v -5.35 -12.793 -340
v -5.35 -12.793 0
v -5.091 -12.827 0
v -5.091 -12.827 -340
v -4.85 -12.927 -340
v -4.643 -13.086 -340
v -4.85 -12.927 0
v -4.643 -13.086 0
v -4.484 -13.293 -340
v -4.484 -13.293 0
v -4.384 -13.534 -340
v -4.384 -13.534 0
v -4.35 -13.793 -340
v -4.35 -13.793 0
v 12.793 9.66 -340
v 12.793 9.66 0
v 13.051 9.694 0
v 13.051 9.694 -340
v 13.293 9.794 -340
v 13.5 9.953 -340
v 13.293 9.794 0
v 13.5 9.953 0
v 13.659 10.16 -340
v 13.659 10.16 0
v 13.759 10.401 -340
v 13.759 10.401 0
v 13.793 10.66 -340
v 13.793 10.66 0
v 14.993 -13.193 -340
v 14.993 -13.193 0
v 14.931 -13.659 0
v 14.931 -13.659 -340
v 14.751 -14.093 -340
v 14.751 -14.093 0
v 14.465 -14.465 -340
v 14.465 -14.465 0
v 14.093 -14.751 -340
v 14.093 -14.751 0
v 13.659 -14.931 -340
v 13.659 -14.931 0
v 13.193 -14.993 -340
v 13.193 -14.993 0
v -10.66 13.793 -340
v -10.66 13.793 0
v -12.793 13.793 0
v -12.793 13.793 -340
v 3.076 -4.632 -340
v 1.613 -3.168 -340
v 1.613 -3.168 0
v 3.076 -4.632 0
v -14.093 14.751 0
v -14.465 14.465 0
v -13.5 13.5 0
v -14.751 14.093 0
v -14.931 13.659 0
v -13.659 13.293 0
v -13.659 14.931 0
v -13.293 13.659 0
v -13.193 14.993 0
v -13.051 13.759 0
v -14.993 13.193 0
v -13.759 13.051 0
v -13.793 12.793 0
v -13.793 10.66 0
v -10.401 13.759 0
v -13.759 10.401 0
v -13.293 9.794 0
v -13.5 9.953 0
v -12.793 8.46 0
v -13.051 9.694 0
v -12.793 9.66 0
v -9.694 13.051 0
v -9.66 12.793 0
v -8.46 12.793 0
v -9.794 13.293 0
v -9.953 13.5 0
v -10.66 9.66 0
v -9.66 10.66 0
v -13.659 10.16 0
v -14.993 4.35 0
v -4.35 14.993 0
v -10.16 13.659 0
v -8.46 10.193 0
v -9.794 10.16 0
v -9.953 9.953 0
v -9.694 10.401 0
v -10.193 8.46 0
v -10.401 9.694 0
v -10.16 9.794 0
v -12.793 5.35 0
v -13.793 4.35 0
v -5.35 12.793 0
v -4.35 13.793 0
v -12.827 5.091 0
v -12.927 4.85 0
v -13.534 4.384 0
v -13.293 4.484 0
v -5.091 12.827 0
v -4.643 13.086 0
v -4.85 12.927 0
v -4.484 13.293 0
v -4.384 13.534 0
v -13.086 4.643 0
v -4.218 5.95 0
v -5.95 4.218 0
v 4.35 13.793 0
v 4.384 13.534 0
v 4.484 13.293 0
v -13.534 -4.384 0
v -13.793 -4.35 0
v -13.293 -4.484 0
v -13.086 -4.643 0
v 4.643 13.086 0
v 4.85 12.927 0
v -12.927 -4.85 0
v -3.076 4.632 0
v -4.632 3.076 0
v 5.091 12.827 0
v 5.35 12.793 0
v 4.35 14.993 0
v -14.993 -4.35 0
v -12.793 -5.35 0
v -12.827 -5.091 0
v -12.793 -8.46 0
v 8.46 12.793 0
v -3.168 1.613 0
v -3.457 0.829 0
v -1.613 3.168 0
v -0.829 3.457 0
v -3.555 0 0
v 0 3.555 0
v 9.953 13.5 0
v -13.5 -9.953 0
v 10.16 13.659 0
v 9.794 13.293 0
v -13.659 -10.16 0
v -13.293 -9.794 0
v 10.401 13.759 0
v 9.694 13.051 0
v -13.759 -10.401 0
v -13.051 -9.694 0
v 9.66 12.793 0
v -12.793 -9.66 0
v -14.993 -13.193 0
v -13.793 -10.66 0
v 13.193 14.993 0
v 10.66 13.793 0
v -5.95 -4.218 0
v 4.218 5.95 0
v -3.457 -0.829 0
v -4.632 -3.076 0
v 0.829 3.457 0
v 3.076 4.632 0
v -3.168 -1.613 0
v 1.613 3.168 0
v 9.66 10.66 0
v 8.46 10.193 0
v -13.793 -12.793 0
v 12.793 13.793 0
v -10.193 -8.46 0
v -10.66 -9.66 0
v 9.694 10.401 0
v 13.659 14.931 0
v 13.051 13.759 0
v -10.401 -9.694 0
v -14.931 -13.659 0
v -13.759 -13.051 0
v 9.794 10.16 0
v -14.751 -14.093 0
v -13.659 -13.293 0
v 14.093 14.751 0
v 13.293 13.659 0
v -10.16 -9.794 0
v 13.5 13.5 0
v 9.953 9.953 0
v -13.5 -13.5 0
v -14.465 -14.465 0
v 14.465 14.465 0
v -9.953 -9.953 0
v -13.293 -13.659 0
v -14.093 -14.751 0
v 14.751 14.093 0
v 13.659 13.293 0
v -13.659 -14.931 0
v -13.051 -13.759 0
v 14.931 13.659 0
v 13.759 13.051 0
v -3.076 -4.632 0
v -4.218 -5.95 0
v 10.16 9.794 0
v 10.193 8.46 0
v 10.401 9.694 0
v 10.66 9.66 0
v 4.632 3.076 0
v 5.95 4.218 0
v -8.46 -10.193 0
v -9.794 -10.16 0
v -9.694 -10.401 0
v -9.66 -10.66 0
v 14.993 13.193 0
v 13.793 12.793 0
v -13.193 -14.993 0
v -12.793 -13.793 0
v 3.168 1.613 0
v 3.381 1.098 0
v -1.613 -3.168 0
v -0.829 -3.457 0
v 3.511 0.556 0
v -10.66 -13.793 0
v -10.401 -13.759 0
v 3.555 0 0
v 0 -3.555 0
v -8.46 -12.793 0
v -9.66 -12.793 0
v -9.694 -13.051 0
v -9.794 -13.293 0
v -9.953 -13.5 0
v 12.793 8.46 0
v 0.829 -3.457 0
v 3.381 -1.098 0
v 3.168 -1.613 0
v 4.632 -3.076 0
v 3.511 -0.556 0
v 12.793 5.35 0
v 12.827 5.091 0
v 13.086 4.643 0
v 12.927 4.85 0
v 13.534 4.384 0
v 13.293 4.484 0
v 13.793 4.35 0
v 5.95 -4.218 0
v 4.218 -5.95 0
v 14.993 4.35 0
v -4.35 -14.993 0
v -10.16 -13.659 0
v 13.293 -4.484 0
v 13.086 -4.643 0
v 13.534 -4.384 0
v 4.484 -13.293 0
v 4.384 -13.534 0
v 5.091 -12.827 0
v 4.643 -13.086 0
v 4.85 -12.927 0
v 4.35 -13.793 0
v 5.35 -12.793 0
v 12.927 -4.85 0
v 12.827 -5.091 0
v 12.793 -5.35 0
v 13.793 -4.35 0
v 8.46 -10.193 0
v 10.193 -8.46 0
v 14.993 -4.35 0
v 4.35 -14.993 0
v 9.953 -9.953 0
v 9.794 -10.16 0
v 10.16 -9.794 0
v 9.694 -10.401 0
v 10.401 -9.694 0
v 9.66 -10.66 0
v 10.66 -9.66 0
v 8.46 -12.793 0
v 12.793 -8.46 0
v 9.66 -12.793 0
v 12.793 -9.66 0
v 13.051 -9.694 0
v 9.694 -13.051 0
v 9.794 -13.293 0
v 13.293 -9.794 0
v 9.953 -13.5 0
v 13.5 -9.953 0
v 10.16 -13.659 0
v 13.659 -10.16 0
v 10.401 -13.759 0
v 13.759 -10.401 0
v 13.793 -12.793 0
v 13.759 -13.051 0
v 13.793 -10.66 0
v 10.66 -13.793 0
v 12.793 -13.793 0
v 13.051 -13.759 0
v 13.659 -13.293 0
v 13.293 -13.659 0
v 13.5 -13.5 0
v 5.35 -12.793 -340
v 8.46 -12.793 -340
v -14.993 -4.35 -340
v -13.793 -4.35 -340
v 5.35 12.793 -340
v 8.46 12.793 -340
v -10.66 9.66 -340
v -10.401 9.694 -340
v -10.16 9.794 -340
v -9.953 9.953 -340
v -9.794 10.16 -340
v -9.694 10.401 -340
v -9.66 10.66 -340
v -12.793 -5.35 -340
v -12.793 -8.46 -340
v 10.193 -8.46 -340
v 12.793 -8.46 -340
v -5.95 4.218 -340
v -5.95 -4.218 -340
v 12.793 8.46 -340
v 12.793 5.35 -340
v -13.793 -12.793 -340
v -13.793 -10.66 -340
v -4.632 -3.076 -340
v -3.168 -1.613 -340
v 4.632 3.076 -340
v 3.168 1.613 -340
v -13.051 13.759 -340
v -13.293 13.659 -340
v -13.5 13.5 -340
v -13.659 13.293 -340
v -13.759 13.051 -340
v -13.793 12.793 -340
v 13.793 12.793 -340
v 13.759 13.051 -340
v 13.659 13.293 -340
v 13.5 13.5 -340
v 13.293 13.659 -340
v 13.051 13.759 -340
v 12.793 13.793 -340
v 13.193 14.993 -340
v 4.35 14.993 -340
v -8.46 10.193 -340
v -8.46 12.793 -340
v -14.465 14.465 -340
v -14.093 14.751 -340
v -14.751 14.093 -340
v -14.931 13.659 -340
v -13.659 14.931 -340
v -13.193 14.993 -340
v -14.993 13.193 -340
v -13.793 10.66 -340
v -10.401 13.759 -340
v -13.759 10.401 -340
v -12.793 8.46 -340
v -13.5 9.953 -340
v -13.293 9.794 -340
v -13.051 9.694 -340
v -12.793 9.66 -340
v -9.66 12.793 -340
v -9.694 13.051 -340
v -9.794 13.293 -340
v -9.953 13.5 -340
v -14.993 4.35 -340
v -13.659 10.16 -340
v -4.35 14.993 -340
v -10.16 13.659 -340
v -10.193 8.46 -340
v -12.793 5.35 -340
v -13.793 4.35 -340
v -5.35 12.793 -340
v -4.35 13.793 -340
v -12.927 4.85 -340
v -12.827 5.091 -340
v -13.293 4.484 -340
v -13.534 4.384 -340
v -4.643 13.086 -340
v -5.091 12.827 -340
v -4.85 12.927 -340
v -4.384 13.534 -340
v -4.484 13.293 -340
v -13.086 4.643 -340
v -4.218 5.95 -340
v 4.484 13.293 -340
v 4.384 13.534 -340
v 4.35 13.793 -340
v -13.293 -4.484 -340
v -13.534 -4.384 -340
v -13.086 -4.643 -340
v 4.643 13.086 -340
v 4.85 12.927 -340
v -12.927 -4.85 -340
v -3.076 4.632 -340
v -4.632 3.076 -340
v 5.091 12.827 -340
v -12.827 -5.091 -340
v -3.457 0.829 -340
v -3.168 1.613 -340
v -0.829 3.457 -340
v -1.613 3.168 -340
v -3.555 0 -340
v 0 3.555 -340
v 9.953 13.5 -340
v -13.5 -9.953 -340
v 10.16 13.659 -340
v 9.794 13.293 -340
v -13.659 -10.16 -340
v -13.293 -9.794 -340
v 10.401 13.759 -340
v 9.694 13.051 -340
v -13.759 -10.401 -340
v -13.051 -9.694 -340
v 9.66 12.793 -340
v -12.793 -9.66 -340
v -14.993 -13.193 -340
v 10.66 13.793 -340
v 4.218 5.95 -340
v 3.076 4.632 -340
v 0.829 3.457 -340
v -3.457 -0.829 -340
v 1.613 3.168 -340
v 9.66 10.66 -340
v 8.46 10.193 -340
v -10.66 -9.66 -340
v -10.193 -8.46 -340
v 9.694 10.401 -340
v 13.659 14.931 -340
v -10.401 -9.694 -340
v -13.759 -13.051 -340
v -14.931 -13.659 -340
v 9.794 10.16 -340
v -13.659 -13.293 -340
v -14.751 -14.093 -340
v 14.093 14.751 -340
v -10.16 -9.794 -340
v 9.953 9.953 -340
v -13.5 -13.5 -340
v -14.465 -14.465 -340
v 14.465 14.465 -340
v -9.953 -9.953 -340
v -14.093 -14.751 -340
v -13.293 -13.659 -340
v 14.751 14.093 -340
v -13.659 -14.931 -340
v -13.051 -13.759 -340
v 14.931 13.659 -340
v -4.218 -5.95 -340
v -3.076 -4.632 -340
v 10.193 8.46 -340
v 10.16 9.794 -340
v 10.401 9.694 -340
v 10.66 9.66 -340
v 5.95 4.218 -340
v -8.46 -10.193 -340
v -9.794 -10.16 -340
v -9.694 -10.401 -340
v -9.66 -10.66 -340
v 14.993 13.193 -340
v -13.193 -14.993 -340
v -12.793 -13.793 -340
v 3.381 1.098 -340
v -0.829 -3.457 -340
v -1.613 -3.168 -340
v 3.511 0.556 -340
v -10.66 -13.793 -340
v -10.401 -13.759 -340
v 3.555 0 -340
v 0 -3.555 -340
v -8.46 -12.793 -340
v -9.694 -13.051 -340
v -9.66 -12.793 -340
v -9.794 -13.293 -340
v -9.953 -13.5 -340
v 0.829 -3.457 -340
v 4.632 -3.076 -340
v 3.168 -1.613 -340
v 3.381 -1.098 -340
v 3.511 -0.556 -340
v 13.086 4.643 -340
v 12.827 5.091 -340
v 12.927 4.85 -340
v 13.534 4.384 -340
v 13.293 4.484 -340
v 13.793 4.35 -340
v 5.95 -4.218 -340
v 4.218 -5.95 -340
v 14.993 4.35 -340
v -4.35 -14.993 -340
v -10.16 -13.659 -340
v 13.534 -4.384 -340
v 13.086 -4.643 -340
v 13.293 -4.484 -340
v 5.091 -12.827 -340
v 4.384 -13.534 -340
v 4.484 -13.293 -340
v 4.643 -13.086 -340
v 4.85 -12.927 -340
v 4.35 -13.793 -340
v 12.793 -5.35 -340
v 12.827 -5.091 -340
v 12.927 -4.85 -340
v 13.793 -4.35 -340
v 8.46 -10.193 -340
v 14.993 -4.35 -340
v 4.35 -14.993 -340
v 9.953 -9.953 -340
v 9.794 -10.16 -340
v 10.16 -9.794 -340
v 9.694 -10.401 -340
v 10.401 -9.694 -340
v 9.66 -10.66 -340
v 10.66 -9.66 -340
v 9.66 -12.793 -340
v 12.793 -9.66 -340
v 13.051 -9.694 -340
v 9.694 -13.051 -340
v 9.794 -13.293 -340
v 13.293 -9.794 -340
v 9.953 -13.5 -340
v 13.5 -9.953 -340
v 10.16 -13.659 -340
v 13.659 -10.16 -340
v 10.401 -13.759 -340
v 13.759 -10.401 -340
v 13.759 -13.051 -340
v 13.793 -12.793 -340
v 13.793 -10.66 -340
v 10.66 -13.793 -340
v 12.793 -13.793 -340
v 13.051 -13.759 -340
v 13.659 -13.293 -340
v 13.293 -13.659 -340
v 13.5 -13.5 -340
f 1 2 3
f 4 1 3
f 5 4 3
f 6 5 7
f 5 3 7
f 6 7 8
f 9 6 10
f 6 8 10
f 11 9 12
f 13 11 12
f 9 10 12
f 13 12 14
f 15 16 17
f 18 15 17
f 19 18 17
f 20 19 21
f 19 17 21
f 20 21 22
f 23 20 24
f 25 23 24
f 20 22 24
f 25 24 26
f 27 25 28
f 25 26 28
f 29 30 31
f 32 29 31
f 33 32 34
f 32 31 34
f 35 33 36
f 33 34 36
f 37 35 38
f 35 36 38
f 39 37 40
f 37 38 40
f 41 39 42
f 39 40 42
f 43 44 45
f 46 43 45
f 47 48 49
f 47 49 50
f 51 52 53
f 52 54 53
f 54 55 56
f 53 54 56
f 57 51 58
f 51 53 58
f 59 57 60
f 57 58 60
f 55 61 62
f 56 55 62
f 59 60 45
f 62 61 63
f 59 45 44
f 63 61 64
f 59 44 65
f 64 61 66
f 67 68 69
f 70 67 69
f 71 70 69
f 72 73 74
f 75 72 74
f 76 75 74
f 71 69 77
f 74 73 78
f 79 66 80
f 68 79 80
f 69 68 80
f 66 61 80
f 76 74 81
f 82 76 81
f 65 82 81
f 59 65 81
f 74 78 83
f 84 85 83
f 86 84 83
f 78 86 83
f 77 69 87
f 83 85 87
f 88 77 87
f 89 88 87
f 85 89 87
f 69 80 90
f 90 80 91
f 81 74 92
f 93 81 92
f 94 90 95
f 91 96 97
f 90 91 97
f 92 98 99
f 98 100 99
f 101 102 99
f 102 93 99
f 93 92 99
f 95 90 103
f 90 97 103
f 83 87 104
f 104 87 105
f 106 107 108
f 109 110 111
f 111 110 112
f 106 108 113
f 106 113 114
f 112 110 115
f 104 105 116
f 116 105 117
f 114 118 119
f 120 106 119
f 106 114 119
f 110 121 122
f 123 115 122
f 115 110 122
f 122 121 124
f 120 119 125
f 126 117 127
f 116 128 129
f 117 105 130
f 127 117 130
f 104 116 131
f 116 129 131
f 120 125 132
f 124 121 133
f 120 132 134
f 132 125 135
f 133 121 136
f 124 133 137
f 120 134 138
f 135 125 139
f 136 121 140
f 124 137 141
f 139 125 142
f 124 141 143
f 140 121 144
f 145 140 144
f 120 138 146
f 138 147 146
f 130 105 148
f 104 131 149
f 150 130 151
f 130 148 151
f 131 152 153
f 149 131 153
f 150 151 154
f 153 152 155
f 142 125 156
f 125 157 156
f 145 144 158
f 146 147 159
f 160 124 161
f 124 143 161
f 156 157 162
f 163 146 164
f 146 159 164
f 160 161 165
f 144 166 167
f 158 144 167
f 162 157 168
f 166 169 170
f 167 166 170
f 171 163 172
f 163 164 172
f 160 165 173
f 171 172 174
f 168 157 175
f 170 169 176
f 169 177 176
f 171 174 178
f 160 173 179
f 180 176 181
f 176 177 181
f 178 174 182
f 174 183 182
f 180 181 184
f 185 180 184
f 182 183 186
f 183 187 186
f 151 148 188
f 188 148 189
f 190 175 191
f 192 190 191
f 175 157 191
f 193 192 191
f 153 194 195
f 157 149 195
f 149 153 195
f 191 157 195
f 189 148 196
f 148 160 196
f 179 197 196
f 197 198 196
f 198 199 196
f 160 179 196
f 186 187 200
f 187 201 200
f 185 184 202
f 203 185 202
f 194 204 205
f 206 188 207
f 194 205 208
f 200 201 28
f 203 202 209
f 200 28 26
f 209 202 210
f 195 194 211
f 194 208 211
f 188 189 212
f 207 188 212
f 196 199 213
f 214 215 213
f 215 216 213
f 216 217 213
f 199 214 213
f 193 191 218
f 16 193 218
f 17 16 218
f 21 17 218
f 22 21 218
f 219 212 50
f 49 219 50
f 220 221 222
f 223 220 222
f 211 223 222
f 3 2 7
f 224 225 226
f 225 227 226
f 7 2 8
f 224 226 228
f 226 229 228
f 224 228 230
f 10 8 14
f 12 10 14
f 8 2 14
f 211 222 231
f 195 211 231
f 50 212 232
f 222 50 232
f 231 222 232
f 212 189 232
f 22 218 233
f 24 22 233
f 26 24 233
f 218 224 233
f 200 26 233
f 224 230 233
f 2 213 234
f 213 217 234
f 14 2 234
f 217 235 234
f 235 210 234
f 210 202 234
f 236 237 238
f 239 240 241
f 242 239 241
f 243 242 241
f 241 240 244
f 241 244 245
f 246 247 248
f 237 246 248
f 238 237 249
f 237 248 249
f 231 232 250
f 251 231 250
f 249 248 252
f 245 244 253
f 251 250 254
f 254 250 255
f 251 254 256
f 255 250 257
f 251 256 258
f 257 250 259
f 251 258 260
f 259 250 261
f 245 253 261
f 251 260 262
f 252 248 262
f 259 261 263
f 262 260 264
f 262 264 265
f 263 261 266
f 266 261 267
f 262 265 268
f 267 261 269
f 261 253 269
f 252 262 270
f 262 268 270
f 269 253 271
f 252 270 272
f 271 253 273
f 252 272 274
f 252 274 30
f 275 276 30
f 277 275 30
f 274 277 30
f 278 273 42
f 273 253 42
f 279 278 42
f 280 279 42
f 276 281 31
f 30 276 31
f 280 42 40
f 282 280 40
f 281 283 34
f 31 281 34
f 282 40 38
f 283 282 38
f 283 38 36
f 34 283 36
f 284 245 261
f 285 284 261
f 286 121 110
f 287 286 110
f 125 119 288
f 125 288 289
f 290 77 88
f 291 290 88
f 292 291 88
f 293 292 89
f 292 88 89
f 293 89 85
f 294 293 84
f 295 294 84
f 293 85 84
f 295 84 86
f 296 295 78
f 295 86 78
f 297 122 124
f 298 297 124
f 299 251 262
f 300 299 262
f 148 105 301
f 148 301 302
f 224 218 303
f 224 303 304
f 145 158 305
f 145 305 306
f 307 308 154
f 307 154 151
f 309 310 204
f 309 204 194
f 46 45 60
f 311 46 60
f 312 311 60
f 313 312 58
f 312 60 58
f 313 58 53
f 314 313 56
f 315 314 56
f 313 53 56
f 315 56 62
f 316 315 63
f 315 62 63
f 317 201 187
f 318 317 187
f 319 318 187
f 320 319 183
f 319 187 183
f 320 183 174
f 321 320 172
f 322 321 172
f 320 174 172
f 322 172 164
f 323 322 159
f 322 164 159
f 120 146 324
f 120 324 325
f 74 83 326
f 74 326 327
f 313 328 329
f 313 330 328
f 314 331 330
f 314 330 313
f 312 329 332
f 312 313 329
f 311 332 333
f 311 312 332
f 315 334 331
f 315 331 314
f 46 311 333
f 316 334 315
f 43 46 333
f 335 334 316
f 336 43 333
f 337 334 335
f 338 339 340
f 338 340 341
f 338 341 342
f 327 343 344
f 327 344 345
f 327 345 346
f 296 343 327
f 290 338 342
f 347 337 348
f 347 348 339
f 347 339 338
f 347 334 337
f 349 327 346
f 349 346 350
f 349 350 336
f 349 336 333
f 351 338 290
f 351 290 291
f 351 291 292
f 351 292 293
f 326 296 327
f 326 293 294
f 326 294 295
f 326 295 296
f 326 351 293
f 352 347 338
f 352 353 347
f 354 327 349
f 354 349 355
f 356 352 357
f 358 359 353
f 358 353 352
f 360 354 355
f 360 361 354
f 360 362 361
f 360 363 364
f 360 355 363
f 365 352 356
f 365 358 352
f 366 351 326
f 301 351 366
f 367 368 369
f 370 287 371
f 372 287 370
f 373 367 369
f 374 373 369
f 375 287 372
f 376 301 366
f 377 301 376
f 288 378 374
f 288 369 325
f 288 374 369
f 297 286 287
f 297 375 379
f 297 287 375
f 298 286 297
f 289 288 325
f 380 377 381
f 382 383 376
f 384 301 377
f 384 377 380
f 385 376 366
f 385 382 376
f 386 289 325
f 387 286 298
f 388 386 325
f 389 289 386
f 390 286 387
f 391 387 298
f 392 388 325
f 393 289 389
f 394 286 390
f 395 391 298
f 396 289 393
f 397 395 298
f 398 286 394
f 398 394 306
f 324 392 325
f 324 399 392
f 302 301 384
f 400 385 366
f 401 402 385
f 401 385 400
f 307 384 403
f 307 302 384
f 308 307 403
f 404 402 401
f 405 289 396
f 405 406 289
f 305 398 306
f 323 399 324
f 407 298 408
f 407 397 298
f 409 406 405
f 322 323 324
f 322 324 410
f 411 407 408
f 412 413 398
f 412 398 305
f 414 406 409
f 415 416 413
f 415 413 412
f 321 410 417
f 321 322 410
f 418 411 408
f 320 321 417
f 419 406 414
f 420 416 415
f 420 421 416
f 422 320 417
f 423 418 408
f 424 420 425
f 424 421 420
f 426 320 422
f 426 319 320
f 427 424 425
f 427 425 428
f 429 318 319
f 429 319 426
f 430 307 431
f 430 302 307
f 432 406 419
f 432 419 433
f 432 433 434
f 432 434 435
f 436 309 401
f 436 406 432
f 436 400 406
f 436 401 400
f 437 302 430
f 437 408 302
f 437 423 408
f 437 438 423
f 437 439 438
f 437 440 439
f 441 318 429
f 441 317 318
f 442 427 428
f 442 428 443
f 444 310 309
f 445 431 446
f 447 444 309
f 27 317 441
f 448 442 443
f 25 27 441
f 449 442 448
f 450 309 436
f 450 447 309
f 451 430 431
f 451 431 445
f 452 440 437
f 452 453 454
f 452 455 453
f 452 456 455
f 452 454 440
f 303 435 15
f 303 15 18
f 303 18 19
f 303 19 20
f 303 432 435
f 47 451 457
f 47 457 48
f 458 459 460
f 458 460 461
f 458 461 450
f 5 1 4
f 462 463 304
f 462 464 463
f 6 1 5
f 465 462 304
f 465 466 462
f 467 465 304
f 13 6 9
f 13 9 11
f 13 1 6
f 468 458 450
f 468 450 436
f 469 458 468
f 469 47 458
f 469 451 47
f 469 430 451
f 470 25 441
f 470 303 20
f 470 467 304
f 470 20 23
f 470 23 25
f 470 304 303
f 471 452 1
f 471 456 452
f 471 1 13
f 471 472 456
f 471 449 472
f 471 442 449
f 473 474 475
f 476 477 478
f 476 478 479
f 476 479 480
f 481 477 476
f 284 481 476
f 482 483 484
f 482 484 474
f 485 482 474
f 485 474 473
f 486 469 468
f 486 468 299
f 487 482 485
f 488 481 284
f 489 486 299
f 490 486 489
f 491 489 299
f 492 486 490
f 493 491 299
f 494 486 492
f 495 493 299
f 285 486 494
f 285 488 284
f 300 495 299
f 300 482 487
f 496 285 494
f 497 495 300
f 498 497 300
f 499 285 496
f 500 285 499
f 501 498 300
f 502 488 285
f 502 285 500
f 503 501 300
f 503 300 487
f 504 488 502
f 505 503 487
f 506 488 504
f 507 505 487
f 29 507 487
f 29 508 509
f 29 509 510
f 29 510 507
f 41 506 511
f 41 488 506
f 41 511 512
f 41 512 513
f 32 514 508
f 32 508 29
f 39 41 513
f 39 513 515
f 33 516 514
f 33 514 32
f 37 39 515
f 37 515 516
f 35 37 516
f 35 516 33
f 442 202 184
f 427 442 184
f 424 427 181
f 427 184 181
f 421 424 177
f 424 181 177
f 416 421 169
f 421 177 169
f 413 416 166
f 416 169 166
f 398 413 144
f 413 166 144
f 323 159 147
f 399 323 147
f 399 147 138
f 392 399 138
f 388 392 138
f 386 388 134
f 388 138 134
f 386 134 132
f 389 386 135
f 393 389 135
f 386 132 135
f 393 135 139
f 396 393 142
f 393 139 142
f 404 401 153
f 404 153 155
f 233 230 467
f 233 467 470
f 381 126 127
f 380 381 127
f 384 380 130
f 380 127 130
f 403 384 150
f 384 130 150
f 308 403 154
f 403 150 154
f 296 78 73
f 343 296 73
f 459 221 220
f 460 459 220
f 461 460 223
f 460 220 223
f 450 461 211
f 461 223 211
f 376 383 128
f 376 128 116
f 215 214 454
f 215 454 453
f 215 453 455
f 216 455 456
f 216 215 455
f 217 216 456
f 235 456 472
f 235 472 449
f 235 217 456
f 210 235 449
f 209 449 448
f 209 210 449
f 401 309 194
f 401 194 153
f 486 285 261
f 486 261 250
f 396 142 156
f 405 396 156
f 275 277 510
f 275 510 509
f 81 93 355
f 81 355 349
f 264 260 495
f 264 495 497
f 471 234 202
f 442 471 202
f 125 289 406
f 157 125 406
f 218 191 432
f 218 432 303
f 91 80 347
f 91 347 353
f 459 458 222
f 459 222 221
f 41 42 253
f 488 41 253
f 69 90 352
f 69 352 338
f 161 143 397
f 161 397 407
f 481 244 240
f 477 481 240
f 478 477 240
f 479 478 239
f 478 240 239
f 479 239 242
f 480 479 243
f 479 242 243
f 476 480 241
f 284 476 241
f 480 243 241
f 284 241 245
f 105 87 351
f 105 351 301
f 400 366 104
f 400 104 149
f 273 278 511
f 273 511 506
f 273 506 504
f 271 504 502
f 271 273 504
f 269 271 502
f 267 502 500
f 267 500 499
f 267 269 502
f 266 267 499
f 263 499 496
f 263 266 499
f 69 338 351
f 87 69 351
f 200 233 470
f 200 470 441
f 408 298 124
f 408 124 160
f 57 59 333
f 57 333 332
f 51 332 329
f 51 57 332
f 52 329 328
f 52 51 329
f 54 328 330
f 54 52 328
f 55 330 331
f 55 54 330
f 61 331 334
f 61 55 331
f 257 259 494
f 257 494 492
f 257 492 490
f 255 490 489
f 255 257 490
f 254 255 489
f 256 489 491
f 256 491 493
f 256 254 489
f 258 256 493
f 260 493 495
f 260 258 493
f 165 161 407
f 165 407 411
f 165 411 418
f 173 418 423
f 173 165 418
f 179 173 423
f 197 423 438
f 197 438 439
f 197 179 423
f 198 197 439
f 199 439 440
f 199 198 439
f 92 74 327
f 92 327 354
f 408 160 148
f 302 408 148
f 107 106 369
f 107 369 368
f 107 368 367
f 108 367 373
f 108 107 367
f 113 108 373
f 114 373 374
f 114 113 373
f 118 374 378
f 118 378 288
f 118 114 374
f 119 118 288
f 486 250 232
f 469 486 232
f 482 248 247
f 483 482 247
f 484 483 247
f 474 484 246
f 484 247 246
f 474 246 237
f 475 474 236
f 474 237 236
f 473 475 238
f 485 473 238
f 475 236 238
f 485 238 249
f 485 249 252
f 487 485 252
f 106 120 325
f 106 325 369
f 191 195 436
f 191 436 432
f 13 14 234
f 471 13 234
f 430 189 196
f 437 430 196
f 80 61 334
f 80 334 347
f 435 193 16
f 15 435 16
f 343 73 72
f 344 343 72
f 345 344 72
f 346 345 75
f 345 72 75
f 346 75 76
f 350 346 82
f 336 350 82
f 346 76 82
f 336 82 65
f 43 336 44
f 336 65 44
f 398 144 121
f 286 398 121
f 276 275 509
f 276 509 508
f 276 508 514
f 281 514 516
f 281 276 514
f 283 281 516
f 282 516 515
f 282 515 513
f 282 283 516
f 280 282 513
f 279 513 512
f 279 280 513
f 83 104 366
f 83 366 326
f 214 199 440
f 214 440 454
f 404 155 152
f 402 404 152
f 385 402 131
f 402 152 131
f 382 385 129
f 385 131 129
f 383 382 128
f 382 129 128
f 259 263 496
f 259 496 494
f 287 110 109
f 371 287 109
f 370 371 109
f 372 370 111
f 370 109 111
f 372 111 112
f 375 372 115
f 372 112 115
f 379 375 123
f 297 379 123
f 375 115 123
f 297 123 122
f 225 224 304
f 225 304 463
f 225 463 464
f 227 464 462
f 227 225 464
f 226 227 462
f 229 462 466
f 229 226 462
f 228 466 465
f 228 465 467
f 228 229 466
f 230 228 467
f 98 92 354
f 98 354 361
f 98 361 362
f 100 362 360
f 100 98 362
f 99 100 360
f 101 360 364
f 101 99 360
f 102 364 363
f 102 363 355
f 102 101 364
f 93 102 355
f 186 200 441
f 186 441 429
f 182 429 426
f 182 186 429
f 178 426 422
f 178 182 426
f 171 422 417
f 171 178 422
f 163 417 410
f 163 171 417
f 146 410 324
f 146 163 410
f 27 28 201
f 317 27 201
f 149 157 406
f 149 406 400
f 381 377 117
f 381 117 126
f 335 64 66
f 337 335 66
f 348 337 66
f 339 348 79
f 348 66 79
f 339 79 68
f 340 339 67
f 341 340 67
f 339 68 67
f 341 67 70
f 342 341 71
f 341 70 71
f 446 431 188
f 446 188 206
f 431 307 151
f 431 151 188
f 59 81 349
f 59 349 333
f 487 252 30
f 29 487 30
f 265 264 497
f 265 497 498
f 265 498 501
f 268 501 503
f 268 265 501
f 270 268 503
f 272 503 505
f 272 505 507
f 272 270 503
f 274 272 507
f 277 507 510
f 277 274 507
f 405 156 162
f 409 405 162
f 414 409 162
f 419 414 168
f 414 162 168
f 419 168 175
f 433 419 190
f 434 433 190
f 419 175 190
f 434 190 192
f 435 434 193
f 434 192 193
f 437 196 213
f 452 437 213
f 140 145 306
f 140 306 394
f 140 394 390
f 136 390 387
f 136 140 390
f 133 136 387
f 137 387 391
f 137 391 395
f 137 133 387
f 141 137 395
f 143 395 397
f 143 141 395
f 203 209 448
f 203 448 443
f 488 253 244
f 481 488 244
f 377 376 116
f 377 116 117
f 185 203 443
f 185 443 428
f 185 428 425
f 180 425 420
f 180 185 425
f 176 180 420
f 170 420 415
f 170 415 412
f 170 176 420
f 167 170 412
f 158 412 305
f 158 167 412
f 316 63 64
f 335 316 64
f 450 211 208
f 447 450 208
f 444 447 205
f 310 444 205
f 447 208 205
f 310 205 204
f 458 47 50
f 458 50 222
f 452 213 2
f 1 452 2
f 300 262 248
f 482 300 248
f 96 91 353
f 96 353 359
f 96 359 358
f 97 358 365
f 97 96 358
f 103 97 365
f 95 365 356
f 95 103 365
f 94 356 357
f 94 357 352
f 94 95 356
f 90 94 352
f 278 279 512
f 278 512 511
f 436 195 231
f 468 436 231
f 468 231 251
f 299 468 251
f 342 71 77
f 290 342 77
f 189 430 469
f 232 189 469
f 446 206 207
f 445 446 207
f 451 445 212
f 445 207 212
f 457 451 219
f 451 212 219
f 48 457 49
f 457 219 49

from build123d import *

# Parameters (mm, degrees)
SKETCH1_W           = 11.9
SKETCH1_H           = 5.95
BOSS_EXTRUDE1_DEPTH = 340
CUT_EXTRUDE1_DEPTH  = 341


with BuildPart() as part:
    # Sketch1 → Boss-Extrude1 (new body)
    with BuildSketch(Plane.XY):
        with BuildLine():
            Line((-4.350229073, 14.992640687), (-13.192640687, 14.992640687))
            ThreePointArc((-13.192640687, 14.992640687), (-14.465432893, 14.465432893), (-14.992640687, 13.192640687))
            Line((-14.992640687, 13.192640687), (-14.992640687, 4.350229073))
            Line((-14.992640687, 4.350229073), (-13.792640687, 4.350229073))
            ThreePointArc((-13.792640687, 4.350229073), (-13.085533906, 4.643122292), (-12.792640687, 5.350229073))
            Line((-12.792640687, 5.350229073), (-12.792640687, 8.460229073))
            Line((-12.792640687, 8.460229073), (-8.460229073, 8.460229073))
            Line((-8.460229073, 8.460229073), (-8.460229073, 12.792640687))
            Line((-8.460229073, 12.792640687), (-5.350229073, 12.792640687))
            ThreePointArc((-5.350229073, 12.792640687), (-4.643122292, 13.085533906), (-4.350229073, 13.792640687))
            Line((-4.350229073, 13.792640687), (-4.350229073, 14.992640687))
        make_face()
        with BuildLine():
            Line((-10.660229073, 13.792640687), (-12.792640687, 13.792640687))
            ThreePointArc((-12.792640687, 13.792640687), (-13.499747468, 13.499747468), (-13.792640687, 12.792640687))
            Line((-13.792640687, 12.792640687), (-13.792640687, 10.660229073))
            ThreePointArc((-13.792640687, 10.660229073), (-13.499747468, 9.953122292), (-12.792640687, 9.660229073))
            Line((-12.792640687, 9.660229073), (-10.660229073, 9.660229073))
            ThreePointArc((-10.660229073, 9.660229073), (-9.953122292, 9.953122292), (-9.660229073, 10.660229073))
            Line((-9.660229073, 10.660229073), (-9.660229073, 12.792640687))
            ThreePointArc((-9.660229073, 12.792640687), (-9.953122292, 13.499747468), (-10.660229073, 13.792640687))
        make_face(mode=Mode.SUBTRACT)
        Polygon((-5.95, 4.217588386), (-5.95, 5.95), (-4.217588386, 5.95), (-8.460229073, 10.192640687), (-8.460229073, 8.460229073), (-10.192640687, 8.460229073), align=None)
        with Locations((0, 2.975)):
            Rectangle(SKETCH1_W, SKETCH1_H)
        Polygon((8.460229073, 10.192640687), (4.217588386, 5.95), (5.95, 5.95), (5.95, 4.217588386), (10.192640687, 8.460229073), (8.460229073, 8.460229073), align=None)
        with BuildLine():
            Line((12.792640687, 8.460229073), (12.792640687, 5.350229073))
            ThreePointArc((12.792640687, 5.350229073), (13.085533906, 4.643122292), (13.792640687, 4.350229073))
            Line((13.792640687, 4.350229073), (14.992640687, 4.350229073))
            Line((14.992640687, 4.350229073), (14.992640687, 13.192640687))
            ThreePointArc((14.992640687, 13.192640687), (14.465432893, 14.465432893), (13.192640687, 14.992640687))
            Line((13.192640687, 14.992640687), (4.350229073, 14.992640687))
            Line((4.350229073, 14.992640687), (4.350229073, 13.792640687))
            ThreePointArc((4.350229073, 13.792640687), (4.643122292, 13.085533906), (5.350229073, 12.792640687))
            Line((5.350229073, 12.792640687), (8.460229073, 12.792640687))
            Line((8.460229073, 12.792640687), (8.460229073, 8.460229073))
            Line((8.460229073, 8.460229073), (12.792640687, 8.460229073))
        make_face()
        with BuildLine():
            ThreePointArc((9.660229073, 10.660229073), (9.953122292, 9.953122292), (10.660229073, 9.660229073))
            Line((10.660229073, 9.660229073), (12.792640687, 9.660229073))
            ThreePointArc((12.792640687, 9.660229073), (13.499747468, 9.953122292), (13.792640687, 10.660229073))
            Line((13.792640687, 10.660229073), (13.792640687, 12.792640687))
            ThreePointArc((13.792640687, 12.792640687), (13.499747468, 13.499747468), (12.792640687, 13.792640687))
            Line((12.792640687, 13.792640687), (10.660229073, 13.792640687))
            ThreePointArc((10.660229073, 13.792640687), (9.953122292, 13.499747468), (9.660229073, 12.792640687))
            Line((9.660229073, 12.792640687), (9.660229073, 10.660229073))
        make_face(mode=Mode.SUBTRACT)
    extrude(amount=-BOSS_EXTRUDE1_DEPTH)

    # Mirror1: part across plane


with BuildPart() as part_1:
    add(part.part)
    add(part.part.mirror(Plane(origin=(0, 0, -340), x_dir=(0, 0, 1), z_dir=(0, -1, 0))))

    # Sketch2 → Cut-Extrude1 (cut, through all)
    with BuildSketch(Plane.XY):
        with BuildLine():
            Line((-4.631549417, 3.075914498), (-3.16821753, 1.612582612))
            ThreePointArc((-3.16821753, 1.612582612), (-2.513764607, 2.513764607), (-1.612582612, 3.16821753))
            Line((-1.612582612, 3.16821753), (-3.075914498, 4.631549417))
            Line((-3.075914498, 4.631549417), (-4.631549417, 3.075914498))
        make_face()
        with BuildLine():
            Line((-3.16821753, 1.612582612), (-1.555634919, 0))
            Line((-1.555634919, 0), (0, 1.555634919))
            Line((0, 1.555634919), (-1.612582612, 3.16821753))
            ThreePointArc((-1.612582612, 3.16821753), (-2.513764607, 2.513764607), (-3.16821753, 1.612582612))
        make_face()
        with BuildLine():
            ThreePointArc((-3.16821753, 1.612582612), (-3.555, 0), (-3.16821753, -1.612582612))
            Line((-3.16821753, -1.612582612), (-1.555634919, 0))
            Line((-1.555634919, 0), (-3.16821753, 1.612582612))
        make_face()
        with BuildLine():
            Line((-4.631549417, -3.075914498), (-3.075914498, -4.631549417))
            Line((-3.075914498, -4.631549417), (-1.612582612, -3.16821753))
            ThreePointArc((-1.612582612, -3.16821753), (-2.513764607, -2.513764607), (-3.16821753, -1.612582612))
            Line((-3.16821753, -1.612582612), (-4.631549417, -3.075914498))
        make_face()
        with BuildLine():
            ThreePointArc((-3.16821753, -1.612582612), (-2.513764607, -2.513764607), (-1.612582612, -3.16821753))
            Line((-1.612582612, -3.16821753), (0, -1.555634919))
            Line((0, -1.555634919), (-1.555634919, 0))
            Line((-1.555634919, 0), (-3.16821753, -1.612582612))
        make_face()
        with BuildLine():
            Line((0, -1.555634919), (-1.612582612, -3.16821753))
            ThreePointArc((-1.612582612, -3.16821753), (0, -3.555), (1.612582612, -3.16821753))
            Line((1.612582612, -3.16821753), (0, -1.555634919))
        make_face()
        with BuildLine():
            Line((1.555634919, 0), (0, -1.555634919))
            Line((0, -1.555634919), (1.612582612, -3.16821753))
            ThreePointArc((1.612582612, -3.16821753), (2.513764607, -2.513764607), (3.16821753, -1.612582612))
            Line((3.16821753, -1.612582612), (1.555634919, 0))
        make_face()
        with BuildLine():
            Line((3.16821753, 1.612582612), (1.555634919, 0))
            Line((1.555634919, 0), (3.16821753, -1.612582612))
            ThreePointArc((3.16821753, -1.612582612), (3.456952294, -0.829159719), (3.555, 0))
            ThreePointArc((3.555, 0), (3.456952294, 0.829159719), (3.16821753, 1.612582612))
        make_face()
        Polygon((-1.555634919, 0), (0, -1.555634919), (1.555634919, 0), (0, 1.555634919), align=None)
        with BuildLine():
            Line((0, 1.555634919), (1.555634919, 0))
            Line((1.555634919, 0), (3.16821753, 1.612582612))
            ThreePointArc((3.16821753, 1.612582612), (2.513764607, 2.513764607), (1.612582612, 3.16821753))
            Line((1.612582612, 3.16821753), (0, 1.555634919))
        make_face()
        with BuildLine():
            Line((-1.612582612, 3.16821753), (0, 1.555634919))
            Line((0, 1.555634919), (1.612582612, 3.16821753))
            ThreePointArc((1.612582612, 3.16821753), (0, 3.555), (-1.612582612, 3.16821753))
        make_face()
        with BuildLine():
            ThreePointArc((1.612582612, 3.16821753), (2.513764607, 2.513764607), (3.16821753, 1.612582612))
            Line((3.16821753, 1.612582612), (4.631549417, 3.075914498))
            Line((4.631549417, 3.075914498), (3.075914498, 4.631549417))
            Line((3.075914498, 4.631549417), (1.612582612, 3.16821753))
        make_face()
        with BuildLine():
            ThreePointArc((3.16821753, -1.612582612), (2.513764607, -2.513764607), (1.612582612, -3.16821753))
            Line((1.612582612, -3.16821753), (3.075914498, -4.631549417))
            Line((3.075914498, -4.631549417), (4.631549417, -3.075914498))
            Line((4.631549417, -3.075914498), (3.16821753, -1.612582612))
        make_face()
    extrude(amount=-CUT_EXTRUDE1_DEPTH, mode=Mode.SUBTRACT)


solid = part_1.part
